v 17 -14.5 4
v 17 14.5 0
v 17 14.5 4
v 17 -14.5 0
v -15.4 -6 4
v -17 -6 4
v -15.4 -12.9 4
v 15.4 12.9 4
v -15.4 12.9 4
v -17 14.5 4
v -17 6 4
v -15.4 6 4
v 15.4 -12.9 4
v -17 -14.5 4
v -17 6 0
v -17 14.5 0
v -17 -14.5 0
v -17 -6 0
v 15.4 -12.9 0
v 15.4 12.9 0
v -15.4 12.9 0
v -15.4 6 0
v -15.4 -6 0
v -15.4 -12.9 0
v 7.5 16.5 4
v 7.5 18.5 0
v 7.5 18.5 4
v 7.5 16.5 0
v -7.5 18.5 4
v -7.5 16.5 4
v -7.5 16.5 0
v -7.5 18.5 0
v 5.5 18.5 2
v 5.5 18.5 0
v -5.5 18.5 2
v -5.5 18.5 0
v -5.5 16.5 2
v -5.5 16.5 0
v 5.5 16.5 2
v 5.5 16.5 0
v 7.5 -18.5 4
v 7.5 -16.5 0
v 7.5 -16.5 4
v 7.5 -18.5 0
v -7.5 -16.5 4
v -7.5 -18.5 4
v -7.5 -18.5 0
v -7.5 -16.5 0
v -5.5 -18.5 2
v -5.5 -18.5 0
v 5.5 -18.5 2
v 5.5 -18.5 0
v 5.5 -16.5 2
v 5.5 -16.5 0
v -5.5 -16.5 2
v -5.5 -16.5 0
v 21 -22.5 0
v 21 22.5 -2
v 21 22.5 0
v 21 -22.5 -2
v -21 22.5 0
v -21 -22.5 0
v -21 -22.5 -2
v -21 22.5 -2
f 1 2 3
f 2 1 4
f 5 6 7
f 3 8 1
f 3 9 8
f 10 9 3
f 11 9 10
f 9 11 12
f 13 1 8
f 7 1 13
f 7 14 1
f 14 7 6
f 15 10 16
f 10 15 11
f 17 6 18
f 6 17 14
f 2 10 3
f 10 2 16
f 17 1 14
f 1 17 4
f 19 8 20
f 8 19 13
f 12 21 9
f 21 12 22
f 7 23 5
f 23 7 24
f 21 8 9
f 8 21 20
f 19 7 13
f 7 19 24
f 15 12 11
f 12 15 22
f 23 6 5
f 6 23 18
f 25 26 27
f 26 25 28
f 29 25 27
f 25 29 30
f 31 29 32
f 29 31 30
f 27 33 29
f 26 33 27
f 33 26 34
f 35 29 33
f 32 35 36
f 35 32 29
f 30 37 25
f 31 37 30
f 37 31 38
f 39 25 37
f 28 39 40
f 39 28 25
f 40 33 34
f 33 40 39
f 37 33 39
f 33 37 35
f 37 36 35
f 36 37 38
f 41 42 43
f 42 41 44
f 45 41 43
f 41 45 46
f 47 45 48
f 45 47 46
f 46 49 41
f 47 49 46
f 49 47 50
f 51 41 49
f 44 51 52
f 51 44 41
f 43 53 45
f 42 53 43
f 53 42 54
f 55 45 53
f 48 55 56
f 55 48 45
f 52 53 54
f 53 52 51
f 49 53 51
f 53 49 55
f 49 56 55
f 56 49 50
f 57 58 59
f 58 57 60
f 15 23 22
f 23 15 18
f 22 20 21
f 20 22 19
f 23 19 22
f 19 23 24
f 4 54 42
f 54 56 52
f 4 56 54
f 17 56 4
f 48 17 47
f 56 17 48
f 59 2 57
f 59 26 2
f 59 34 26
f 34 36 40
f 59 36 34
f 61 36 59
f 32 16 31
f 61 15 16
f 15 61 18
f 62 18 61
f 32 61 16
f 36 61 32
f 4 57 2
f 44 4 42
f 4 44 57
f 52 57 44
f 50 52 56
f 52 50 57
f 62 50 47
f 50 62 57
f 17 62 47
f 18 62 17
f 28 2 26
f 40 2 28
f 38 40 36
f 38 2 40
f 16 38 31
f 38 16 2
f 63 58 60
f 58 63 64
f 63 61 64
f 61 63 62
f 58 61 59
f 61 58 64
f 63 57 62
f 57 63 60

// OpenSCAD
// file: ../lipo-cradle.scad
//-----------------------------------------------------------------------
// LiPo pouch cell, in a low open cradle on the floor
//
// A low wall round the pack's footprint, with a gap on one side for the
// lead. The pack drops in and the lid (or a strap) keeps it down. Optional
// strap bars on the two long sides take a hook-and-loop strap over the pack:
// the strap goes down outside the wall, under the bar, and back up.
//
// Modules, all in the same frame:
//   lipoGhost()    the pack, for previews
//   lipoCradle()   the plastic: wall, lead gap, optional strap bars
//   lipoBody()     the pack as a plain solid (views, collision checks)
//
// Frame: origin on the floor top, at the centre of the pack's footprint.
// X along the pack's length (the tab and lead at -X), Y across its width,
// Z up. Units: mm.
//
// Sizes: the pouch code on the label, TTWWLL = thickness in tenths of a mm,
// width, length in whole mm (602530 = 6.0 x 25 x 30). Named packs are in
// lipoPacks; lipoCodeDims("503035") decodes any other code. Codes are the
// CELL: a pack with its protection board folded at the tab end is a few mm
// longer, and pouches swell, so measure the pack and use the allowances.
//
// Use with `use <.../components/lipo-cradle/lipo-cradle.scad>`.
//-----------------------------------------------------------------------

//-- [name, thickness, width, length, note]. The cell sizes from the code, except where measured
lipoPacks = [
  ["402030",  4.0, 20, 30, ""],
  ["502030",  5.0, 20, 30, ""],
  ["602530",  6.0, 25, 30, "500 mAh in use, controller project (label read 2026-10-30)"],
  ["503035",  5.0, 30, 35, ""],
  ["403048",  4.0, 30, 48, ""],
  ["603048",  6.0, 30, 48, ""],
  ["503450",  5.0, 34, 50, ""],
  ["603450",  6.0, 34, 50, ""],
  ["103450", 10.0, 34, 50, "the 10 is whole mm: 1800-2000 mAh"],
  ["902030",  9.0, 20, 30, ""],
  ["605060",  6.0, 50, 60, ""],
  ["803860",  8.0, 38, 60, "2000 mAh class"],
  ["PKCell-2000", 8.0, 38, 60, "Pi Hut 105187, 2000 mAh, vendor size; lead 100, JST-PH"],
];

//-- decode a six-digit code: TT in tenths of a mm (20 and up), WW, LL in mm.
//-- Codes starting with 1 (10-19) are ambiguous (103450 is 10 mm thick): put them in lipoPacks
function lipoCodeDims(code) =
  let (d = [for (c = code) ord(c) - 48],
       t = d[0]*10 + d[1])
  assert(len(code) == 6 && min(d) >= 0 && max(d) <= 9, str("not a six-digit pouch code: ", code))
  assert(t >= 20, str("ambiguous thickness in ", code, ": add it to lipoPacks"))
  [t/10, d[2]*10 + d[3], d[4]*10 + d[5]];

//-- [thickness, width, length] by name, or decoded from the code
function lipoDims(name) = let (i = search([name], lipoPacks)[0])
  (i != [] && i != undef) ? [lipoPacks[i][1], lipoPacks[i][2], lipoPacks[i][3]] : lipoCodeDims(name);

lipoDefault    = "602530";

//-- The cradle
lipoClearance  = 0.4;     // each side, pack to wall (controller base fitClearance). CAL by the fit piece
lipoWall       = 1.6;
lipoWallH      = 4;       // above the floor (controller base: 4 for a 6 thick pack)
lipoLeadGap    = 12;      // gap in the wall for the lead (controller base: 12)
lipoPcmAllow   = 0;       // added to the length at the tab end, for a protection board past the cell: CAL
lipoSwell      = 0.10;    // allow 10 % on the thickness for a pouch swelling with age
lipoTopGap     = 0.5;     // above the swollen pack, under the lid
//-- strap bars: off unless strap > 0 (the strap's width)
lipoStrapGap   = 2.0;     // wall to bar, and floor to bar: room for the strap
lipoStrapBar   = 2.0;     // bar thickness (Y) and height (Z)
lipoStrapPost  = 2.0;     // posts each end of the bar

//-- headroom over the floor the lid must clear
function lipoHeadroom(name = lipoDefault, swell = lipoSwell) = lipoDims(name)[0]*(1 + swell) + lipoTopGap;

module lipoBody(name = lipoDefault, pcm = lipoPcmAllow)
{
  d = lipoDims(name);
  translate([-d[2]/2 - pcm, -d[1]/2, 0]) cube([d[2] + pcm, d[1], d[0]]);
}

module lipoGhost(name = lipoDefault, pcm = lipoPcmAllow)
{
  d = lipoDims(name);
  %color("Silver") lipoBody(name, pcm);
  //-- the lead, out of the tab end
  for (s = [-1, 1])
    %color(s < 0 ? "Black" : "Red") translate([-d[2]/2 - pcm - 15, s*1.2 - 0.6, d[0]/2 - 0.6]) cube([15, 1.2, 1.2]);
}

//-- leadSide: "-x" (default, the tab end), "+x", "-y", "+y". strap: strap width, 0 for none
module lipoCradle(name = lipoDefault, clearance = lipoClearance, h = lipoWallH, leadSide = "-x",
                  gap = lipoLeadGap, pcm = lipoPcmAllow, strap = 0)
{
  d = lipoDims(name);
  lx = d[2] + pcm; ly = d[1];
  x0 = -d[2]/2 - pcm;                                    // pack's -X end
  c = clearance; w = lipoWall;
  assert(gap < min(lx, ly) - 2, "lead gap wider than the side it's in");
  translate([0, 0, -0.01])
    difference()
    {
      translate([x0 - c - w, -ly/2 - c - w, 0]) cube([lx + 2*(c + w), ly + 2*(c + w), h + 0.01]);
      translate([x0 - c, -ly/2 - c, -1]) cube([lx + 2*c, ly + 2*c, h + 2]);
      //-- lead gap, centred on its side
      if (leadSide == "-x") translate([x0 - c - w - 1, -gap/2, -1]) cube([w + 2, gap, h + 2]);
      if (leadSide == "+x") translate([x0 + lx + c - 1, -gap/2, -1]) cube([w + 2, gap, h + 2]);
      if (leadSide == "-y") translate([x0 + lx/2 - gap/2, -ly/2 - c - w - 1, -1]) cube([gap, w + 2, h + 2]);
      if (leadSide == "+y") translate([x0 + lx/2 - gap/2, ly/2 + c - 1, -1]) cube([gap, w + 2, h + 2]);
    }
  //-- strap bars on the long sides, across the middle of the pack
  if (strap > 0)
    for (m = [0, 1])
      mirror([0, m, 0])
        translate([x0 + lx/2, ly/2 + c + w + lipoStrapGap, -0.01])
          difference()
          {
            translate([-strap/2 - 0.5 - lipoStrapPost, 0, 0])
              cube([strap + 1 + 2*lipoStrapPost, lipoStrapBar, lipoStrapGap + lipoStrapBar + 0.01]);
            translate([-strap/2 - 0.5, -1, -1]) cube([strap + 1, lipoStrapBar + 2, lipoStrapGap + 1.01]);
          }
}
// main file
// One cradle with strap bars on a piece of floor, for the catalogue.
use <../lipo-cradle.scad>

name = "602530";
d = lipoDims(name);

translate([-d[2]/2 - 6, -d[1]/2 - 10, -2]) cube([d[2] + 12, d[1] + 20, 2]);
lipoCradle(name, strap = 10);
